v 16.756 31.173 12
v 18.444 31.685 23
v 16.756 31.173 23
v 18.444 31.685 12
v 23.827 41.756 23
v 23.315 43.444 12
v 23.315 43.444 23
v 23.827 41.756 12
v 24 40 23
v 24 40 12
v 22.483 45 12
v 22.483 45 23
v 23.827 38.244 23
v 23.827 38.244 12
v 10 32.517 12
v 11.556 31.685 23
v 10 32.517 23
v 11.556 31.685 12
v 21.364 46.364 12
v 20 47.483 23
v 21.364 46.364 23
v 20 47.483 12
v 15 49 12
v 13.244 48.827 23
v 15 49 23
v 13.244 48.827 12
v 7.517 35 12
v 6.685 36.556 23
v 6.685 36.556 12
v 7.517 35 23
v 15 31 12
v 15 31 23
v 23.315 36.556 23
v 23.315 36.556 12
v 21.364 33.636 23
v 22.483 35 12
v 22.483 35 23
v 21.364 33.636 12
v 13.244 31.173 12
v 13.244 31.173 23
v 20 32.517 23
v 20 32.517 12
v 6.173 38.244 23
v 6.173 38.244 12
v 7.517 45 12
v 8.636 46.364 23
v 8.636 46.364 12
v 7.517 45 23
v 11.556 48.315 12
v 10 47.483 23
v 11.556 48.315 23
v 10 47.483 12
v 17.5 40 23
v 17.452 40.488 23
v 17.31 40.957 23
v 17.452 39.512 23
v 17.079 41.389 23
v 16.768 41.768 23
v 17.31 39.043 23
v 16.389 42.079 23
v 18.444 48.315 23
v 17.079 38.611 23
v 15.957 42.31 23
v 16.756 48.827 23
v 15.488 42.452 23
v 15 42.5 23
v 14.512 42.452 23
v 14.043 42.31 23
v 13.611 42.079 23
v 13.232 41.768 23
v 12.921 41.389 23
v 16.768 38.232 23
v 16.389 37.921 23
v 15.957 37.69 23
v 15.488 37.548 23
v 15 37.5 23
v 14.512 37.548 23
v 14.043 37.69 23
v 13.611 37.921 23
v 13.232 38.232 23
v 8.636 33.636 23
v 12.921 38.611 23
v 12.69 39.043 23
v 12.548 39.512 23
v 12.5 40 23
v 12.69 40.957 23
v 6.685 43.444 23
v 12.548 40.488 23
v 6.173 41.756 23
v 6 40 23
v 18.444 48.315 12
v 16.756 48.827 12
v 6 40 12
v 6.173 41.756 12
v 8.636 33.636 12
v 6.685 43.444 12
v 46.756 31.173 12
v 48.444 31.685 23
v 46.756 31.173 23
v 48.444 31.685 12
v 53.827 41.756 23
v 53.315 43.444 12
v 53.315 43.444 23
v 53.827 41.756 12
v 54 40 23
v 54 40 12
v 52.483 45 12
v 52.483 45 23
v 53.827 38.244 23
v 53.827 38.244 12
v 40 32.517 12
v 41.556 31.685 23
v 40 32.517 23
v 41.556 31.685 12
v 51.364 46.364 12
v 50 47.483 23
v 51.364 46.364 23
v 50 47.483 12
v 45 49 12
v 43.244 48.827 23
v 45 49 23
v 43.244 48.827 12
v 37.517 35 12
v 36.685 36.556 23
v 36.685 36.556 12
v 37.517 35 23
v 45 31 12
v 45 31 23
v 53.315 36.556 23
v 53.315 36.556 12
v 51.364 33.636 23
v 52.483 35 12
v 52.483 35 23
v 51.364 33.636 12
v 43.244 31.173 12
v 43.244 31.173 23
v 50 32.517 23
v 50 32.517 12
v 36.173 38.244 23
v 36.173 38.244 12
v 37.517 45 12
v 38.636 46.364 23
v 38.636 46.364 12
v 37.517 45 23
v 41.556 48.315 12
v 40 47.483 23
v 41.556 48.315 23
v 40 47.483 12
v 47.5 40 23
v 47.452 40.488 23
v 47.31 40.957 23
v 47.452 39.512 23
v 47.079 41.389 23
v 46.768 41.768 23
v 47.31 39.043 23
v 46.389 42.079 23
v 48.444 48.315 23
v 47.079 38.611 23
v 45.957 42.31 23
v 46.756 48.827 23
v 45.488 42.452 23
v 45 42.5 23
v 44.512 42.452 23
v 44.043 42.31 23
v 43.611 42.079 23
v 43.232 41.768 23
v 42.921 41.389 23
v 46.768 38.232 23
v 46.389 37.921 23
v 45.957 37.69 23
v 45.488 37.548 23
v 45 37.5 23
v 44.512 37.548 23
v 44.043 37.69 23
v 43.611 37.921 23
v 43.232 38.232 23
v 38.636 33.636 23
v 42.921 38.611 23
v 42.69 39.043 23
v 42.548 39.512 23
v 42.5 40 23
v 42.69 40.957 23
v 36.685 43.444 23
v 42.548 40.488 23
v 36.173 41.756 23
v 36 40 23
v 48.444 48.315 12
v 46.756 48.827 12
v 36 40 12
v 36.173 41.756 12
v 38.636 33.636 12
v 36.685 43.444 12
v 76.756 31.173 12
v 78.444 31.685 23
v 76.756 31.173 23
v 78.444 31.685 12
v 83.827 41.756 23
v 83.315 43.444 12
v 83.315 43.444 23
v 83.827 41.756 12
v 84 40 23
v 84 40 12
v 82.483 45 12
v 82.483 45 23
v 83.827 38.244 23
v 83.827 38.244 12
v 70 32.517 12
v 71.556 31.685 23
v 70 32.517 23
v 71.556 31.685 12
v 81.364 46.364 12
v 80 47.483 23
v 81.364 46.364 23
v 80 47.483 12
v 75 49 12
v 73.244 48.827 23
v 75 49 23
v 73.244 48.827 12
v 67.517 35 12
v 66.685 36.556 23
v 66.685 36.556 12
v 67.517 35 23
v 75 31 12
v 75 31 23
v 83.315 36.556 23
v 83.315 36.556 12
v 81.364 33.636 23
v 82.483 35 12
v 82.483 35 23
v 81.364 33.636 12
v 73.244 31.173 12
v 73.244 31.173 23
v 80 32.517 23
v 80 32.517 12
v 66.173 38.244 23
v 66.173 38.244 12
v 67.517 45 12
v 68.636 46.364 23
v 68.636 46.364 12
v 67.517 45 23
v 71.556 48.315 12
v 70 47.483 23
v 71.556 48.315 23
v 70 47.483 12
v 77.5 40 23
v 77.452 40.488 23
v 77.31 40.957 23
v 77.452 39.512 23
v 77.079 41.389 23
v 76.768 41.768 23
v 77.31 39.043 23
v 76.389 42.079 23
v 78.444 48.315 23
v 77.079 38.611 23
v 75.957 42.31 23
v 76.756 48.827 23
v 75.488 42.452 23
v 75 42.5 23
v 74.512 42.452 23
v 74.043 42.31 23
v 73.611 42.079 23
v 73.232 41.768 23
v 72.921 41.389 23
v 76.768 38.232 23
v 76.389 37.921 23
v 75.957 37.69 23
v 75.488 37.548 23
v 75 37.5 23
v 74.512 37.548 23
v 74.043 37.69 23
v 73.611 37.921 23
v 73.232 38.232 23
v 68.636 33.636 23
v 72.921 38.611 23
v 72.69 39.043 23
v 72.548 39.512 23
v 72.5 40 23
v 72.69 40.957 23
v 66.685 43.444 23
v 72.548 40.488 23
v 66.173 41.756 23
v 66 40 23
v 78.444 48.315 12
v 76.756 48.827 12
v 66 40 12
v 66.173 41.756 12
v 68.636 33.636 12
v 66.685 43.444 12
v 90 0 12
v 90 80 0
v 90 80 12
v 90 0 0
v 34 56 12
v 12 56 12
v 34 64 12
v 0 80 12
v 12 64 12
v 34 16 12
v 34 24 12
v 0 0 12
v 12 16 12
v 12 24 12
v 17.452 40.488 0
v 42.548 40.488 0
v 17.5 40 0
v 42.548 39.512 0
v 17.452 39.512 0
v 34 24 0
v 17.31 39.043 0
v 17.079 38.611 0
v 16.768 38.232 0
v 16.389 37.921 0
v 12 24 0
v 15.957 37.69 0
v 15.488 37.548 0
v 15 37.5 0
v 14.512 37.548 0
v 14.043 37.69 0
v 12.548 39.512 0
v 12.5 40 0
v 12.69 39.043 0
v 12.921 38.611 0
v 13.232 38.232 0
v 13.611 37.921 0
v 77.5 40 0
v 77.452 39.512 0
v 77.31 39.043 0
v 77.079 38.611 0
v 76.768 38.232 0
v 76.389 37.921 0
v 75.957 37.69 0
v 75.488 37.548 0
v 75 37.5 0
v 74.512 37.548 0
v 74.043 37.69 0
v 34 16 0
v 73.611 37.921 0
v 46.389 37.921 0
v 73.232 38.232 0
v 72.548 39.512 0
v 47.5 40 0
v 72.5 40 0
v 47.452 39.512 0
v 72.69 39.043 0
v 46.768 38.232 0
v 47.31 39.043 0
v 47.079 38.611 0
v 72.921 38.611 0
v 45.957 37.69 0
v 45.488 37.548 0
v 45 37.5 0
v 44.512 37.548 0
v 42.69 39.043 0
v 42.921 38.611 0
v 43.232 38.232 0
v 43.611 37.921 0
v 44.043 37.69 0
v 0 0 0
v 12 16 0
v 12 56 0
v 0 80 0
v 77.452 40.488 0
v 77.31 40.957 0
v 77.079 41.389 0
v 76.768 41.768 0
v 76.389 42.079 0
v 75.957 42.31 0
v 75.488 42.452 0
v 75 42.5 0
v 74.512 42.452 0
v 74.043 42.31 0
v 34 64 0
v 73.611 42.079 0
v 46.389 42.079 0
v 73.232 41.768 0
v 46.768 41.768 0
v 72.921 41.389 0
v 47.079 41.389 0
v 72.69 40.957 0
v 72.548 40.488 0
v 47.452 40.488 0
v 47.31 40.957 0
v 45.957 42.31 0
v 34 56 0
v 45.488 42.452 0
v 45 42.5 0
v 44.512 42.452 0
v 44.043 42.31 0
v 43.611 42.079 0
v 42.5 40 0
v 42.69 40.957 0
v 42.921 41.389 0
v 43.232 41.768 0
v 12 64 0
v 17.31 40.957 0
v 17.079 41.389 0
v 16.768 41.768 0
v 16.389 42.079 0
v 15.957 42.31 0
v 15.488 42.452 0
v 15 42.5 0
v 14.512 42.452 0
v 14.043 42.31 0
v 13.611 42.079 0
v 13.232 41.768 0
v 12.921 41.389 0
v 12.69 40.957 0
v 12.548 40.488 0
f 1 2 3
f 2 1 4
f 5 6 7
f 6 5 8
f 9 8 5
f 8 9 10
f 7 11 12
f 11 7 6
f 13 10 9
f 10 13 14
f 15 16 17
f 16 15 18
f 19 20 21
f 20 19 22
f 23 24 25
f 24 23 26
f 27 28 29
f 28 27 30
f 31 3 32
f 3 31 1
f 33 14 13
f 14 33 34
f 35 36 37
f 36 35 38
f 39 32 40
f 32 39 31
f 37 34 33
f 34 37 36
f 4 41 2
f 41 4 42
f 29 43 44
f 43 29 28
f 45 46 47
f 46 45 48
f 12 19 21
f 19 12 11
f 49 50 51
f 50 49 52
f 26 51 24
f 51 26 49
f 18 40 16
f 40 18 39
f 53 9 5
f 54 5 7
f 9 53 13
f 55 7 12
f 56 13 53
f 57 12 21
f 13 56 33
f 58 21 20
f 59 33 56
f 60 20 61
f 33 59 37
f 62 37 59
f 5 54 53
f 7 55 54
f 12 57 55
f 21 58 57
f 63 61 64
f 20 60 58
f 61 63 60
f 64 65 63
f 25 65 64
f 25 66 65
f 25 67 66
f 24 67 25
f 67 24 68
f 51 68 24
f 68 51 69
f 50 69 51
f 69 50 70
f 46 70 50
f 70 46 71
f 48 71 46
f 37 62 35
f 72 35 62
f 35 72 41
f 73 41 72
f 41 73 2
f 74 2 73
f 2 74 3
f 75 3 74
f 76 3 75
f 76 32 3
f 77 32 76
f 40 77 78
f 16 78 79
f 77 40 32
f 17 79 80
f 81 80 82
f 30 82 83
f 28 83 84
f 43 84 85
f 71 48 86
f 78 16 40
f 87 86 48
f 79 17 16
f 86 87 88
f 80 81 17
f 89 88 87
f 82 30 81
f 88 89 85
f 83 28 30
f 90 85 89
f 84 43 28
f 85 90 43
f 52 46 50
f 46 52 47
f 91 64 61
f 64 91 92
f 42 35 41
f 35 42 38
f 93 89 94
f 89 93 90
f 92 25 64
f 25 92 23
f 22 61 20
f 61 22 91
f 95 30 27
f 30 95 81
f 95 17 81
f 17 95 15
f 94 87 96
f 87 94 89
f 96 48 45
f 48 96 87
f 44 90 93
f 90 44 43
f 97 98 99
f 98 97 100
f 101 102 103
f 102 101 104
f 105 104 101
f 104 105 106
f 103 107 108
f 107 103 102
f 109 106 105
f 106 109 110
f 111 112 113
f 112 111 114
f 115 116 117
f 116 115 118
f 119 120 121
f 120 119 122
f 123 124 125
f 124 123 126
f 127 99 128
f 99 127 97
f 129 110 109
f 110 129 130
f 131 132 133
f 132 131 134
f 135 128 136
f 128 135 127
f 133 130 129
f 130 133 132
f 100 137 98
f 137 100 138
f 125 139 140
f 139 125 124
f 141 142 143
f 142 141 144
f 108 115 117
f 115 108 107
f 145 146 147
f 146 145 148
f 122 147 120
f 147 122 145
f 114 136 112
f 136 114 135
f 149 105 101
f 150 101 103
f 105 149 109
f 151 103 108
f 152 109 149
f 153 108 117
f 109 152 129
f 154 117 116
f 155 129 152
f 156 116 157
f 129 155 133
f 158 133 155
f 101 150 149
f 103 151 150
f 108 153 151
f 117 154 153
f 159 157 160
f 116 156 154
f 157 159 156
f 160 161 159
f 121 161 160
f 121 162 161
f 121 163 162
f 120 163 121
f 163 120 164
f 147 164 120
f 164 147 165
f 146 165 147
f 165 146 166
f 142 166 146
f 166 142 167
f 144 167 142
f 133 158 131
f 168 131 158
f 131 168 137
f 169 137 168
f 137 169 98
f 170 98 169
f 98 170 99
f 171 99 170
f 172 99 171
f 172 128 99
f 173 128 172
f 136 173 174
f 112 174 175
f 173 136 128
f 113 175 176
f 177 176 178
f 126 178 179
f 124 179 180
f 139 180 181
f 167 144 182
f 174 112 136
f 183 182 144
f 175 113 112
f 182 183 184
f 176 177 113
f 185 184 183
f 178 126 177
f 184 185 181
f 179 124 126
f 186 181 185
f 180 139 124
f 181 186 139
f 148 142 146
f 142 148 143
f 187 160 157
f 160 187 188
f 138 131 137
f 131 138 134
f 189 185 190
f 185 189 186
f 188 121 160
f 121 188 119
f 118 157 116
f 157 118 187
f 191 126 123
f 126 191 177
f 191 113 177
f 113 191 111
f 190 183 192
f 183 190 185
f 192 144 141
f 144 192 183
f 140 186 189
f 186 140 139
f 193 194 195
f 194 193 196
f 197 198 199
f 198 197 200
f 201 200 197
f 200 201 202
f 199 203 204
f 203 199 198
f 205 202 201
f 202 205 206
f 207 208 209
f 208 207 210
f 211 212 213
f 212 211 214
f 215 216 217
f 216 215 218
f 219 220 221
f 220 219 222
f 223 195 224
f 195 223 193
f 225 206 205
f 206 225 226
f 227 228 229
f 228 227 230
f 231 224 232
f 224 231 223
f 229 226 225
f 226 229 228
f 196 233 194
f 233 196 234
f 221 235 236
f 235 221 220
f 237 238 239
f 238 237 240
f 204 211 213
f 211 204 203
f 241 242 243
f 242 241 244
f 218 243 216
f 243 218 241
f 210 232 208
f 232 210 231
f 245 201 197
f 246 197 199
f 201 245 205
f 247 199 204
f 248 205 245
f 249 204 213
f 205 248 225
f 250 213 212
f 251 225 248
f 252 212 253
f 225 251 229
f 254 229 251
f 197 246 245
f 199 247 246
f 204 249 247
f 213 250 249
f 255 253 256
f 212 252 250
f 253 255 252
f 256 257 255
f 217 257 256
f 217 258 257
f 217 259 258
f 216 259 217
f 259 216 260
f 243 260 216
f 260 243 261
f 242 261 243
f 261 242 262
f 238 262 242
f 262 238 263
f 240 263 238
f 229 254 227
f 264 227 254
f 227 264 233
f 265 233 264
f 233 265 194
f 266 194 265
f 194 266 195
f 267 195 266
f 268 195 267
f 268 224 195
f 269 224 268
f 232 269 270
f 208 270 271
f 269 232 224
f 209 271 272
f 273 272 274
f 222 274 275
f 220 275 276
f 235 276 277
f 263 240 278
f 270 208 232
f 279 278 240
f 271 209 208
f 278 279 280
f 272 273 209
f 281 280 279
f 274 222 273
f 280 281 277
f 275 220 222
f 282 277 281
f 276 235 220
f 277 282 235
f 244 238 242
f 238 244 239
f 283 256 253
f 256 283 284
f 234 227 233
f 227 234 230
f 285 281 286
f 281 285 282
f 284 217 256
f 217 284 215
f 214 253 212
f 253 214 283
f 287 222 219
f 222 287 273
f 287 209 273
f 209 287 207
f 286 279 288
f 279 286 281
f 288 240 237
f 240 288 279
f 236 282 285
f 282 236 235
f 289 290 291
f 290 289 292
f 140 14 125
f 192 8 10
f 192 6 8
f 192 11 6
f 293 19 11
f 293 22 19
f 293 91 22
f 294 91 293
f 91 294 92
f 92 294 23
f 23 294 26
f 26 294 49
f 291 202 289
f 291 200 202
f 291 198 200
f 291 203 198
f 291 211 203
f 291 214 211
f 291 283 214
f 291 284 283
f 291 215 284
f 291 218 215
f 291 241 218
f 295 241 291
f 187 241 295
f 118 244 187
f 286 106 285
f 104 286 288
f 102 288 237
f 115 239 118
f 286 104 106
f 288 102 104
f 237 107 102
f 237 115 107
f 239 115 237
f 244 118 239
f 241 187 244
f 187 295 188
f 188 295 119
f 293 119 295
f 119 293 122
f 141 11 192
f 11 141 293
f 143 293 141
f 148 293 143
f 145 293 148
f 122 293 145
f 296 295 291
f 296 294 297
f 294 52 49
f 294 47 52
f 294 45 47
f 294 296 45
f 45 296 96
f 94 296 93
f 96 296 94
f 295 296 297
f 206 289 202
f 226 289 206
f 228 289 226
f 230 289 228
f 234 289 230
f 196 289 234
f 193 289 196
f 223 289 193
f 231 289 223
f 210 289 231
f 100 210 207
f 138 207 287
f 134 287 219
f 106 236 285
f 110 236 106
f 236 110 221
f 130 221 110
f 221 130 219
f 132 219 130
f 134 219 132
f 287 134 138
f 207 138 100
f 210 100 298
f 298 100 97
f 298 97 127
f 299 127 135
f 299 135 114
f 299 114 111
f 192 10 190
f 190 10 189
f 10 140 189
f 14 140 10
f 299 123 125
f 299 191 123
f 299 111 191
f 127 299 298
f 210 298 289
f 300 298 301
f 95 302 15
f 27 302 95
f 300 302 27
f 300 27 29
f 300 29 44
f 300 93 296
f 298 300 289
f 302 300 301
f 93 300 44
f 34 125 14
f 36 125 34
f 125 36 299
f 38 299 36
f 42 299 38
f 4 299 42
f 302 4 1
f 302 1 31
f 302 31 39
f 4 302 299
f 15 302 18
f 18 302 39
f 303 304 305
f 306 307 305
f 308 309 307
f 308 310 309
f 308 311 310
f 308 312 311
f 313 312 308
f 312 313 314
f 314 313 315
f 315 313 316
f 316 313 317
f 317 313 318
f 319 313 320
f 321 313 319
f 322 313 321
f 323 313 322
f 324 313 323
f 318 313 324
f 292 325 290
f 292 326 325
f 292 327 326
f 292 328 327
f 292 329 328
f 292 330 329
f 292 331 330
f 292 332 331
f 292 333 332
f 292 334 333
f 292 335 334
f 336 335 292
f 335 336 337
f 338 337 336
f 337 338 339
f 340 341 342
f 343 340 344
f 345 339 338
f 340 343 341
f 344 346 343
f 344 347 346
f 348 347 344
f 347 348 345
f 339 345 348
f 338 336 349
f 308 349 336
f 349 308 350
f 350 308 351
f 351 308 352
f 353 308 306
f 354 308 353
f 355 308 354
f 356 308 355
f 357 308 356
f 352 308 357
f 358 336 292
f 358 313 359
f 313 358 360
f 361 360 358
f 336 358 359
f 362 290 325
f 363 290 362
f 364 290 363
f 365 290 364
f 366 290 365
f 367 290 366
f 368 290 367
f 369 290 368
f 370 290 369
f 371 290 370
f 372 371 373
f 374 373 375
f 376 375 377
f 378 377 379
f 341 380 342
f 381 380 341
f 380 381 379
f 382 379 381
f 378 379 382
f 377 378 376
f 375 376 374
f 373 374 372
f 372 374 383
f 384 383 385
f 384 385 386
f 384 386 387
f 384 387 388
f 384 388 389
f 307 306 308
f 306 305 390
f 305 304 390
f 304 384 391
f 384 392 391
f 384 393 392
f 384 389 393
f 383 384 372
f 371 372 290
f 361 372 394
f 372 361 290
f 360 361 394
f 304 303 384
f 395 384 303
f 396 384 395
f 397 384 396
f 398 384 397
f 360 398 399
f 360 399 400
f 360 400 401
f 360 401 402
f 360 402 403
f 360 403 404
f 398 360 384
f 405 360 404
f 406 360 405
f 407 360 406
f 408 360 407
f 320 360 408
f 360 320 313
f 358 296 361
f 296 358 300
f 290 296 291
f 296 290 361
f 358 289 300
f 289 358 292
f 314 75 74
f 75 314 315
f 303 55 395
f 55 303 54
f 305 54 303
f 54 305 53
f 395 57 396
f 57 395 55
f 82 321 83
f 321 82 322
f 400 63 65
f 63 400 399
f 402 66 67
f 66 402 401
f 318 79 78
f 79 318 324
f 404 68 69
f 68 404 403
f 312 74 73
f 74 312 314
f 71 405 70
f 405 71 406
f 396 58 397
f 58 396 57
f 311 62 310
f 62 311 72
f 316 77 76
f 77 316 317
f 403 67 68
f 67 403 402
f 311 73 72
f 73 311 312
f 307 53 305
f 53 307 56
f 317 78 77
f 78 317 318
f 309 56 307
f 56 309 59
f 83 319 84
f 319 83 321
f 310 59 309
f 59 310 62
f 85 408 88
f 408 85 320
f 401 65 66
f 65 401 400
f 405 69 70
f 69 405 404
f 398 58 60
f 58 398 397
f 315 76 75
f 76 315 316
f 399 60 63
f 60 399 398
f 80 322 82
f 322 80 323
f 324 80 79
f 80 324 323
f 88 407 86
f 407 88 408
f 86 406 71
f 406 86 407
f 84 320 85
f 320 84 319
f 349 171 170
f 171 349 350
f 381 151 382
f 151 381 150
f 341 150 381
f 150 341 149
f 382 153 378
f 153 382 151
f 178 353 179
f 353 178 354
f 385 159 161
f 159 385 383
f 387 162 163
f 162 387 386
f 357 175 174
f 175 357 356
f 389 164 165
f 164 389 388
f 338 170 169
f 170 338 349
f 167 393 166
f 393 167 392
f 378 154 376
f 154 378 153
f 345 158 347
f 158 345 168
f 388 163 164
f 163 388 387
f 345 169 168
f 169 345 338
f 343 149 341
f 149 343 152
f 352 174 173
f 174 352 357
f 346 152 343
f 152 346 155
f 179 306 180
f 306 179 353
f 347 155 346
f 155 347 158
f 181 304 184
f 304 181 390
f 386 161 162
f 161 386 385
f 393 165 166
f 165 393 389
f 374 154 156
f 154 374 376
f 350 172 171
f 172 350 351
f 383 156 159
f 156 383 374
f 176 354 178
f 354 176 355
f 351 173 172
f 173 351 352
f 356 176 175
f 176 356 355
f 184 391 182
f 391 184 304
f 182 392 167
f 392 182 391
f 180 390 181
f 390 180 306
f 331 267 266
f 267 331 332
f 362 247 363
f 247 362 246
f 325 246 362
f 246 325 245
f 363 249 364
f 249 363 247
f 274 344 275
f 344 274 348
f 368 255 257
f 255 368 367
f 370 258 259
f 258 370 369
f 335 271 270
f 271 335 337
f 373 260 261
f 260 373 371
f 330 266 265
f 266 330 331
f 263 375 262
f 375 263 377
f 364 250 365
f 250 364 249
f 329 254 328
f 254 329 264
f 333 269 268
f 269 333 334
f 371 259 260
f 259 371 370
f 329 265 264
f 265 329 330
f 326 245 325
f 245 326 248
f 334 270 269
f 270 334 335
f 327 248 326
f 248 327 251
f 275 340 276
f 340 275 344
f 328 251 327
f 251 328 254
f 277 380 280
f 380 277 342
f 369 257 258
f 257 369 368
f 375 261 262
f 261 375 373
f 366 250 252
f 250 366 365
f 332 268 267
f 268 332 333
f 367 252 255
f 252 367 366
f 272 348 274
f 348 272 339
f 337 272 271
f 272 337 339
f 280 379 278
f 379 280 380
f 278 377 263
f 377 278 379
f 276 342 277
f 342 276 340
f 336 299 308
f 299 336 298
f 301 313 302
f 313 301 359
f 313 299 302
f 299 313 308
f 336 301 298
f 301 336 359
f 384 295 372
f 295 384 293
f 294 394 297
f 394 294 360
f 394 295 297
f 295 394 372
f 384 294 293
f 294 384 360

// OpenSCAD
$fn = 32;

// ----------------------------------------------------------------------
// Drill jig: three_boss_slot jig
// ----------------------------------------------------------------------

// --- parameters (mm) ---
plate_l = 90;             // plate length, X
plate_w = 80;             // plate width, Y
plate_t = 12;             // plate thickness
boss_d = 18;              // guide boss diameter
boss_h = 12;              // boss height above the plate
guide_d = 5;              // guide hole diameter
boss_pitch = 30;          // boss pitch
slot_w = 8;               // clamp slot width
slot_l = 22;              // clamp slot length
slot_x = 12;              // slot start X

n_boss = 3;  // guide bosses
boss_x0 = (plate_l - (n_boss - 1) * boss_pitch) / 2;  // first boss X
boss_top = plate_t - 1 + boss_h;  // boss crown height
total_h = boss_top;  // overall height

difference() {
  union() {
  cube([plate_l, plate_w, plate_t]);
  for (i = [0 : n_boss - 1])
    translate([boss_x0 + i * boss_pitch, plate_w / 2, plate_t - 1])
      cylinder(h = boss_h, d = boss_d);
  }
  for (i = [0 : n_boss - 1])
    translate([boss_x0 + i * boss_pitch, plate_w / 2, -1])
      cylinder(h = plate_t + boss_h, d = guide_d);
  for (cy = [plate_w * 0.25, plate_w * 0.75])
    translate([slot_x, cy - slot_w / 2, -1])
      cube([slot_l, slot_w, plate_t + 2]);
}
